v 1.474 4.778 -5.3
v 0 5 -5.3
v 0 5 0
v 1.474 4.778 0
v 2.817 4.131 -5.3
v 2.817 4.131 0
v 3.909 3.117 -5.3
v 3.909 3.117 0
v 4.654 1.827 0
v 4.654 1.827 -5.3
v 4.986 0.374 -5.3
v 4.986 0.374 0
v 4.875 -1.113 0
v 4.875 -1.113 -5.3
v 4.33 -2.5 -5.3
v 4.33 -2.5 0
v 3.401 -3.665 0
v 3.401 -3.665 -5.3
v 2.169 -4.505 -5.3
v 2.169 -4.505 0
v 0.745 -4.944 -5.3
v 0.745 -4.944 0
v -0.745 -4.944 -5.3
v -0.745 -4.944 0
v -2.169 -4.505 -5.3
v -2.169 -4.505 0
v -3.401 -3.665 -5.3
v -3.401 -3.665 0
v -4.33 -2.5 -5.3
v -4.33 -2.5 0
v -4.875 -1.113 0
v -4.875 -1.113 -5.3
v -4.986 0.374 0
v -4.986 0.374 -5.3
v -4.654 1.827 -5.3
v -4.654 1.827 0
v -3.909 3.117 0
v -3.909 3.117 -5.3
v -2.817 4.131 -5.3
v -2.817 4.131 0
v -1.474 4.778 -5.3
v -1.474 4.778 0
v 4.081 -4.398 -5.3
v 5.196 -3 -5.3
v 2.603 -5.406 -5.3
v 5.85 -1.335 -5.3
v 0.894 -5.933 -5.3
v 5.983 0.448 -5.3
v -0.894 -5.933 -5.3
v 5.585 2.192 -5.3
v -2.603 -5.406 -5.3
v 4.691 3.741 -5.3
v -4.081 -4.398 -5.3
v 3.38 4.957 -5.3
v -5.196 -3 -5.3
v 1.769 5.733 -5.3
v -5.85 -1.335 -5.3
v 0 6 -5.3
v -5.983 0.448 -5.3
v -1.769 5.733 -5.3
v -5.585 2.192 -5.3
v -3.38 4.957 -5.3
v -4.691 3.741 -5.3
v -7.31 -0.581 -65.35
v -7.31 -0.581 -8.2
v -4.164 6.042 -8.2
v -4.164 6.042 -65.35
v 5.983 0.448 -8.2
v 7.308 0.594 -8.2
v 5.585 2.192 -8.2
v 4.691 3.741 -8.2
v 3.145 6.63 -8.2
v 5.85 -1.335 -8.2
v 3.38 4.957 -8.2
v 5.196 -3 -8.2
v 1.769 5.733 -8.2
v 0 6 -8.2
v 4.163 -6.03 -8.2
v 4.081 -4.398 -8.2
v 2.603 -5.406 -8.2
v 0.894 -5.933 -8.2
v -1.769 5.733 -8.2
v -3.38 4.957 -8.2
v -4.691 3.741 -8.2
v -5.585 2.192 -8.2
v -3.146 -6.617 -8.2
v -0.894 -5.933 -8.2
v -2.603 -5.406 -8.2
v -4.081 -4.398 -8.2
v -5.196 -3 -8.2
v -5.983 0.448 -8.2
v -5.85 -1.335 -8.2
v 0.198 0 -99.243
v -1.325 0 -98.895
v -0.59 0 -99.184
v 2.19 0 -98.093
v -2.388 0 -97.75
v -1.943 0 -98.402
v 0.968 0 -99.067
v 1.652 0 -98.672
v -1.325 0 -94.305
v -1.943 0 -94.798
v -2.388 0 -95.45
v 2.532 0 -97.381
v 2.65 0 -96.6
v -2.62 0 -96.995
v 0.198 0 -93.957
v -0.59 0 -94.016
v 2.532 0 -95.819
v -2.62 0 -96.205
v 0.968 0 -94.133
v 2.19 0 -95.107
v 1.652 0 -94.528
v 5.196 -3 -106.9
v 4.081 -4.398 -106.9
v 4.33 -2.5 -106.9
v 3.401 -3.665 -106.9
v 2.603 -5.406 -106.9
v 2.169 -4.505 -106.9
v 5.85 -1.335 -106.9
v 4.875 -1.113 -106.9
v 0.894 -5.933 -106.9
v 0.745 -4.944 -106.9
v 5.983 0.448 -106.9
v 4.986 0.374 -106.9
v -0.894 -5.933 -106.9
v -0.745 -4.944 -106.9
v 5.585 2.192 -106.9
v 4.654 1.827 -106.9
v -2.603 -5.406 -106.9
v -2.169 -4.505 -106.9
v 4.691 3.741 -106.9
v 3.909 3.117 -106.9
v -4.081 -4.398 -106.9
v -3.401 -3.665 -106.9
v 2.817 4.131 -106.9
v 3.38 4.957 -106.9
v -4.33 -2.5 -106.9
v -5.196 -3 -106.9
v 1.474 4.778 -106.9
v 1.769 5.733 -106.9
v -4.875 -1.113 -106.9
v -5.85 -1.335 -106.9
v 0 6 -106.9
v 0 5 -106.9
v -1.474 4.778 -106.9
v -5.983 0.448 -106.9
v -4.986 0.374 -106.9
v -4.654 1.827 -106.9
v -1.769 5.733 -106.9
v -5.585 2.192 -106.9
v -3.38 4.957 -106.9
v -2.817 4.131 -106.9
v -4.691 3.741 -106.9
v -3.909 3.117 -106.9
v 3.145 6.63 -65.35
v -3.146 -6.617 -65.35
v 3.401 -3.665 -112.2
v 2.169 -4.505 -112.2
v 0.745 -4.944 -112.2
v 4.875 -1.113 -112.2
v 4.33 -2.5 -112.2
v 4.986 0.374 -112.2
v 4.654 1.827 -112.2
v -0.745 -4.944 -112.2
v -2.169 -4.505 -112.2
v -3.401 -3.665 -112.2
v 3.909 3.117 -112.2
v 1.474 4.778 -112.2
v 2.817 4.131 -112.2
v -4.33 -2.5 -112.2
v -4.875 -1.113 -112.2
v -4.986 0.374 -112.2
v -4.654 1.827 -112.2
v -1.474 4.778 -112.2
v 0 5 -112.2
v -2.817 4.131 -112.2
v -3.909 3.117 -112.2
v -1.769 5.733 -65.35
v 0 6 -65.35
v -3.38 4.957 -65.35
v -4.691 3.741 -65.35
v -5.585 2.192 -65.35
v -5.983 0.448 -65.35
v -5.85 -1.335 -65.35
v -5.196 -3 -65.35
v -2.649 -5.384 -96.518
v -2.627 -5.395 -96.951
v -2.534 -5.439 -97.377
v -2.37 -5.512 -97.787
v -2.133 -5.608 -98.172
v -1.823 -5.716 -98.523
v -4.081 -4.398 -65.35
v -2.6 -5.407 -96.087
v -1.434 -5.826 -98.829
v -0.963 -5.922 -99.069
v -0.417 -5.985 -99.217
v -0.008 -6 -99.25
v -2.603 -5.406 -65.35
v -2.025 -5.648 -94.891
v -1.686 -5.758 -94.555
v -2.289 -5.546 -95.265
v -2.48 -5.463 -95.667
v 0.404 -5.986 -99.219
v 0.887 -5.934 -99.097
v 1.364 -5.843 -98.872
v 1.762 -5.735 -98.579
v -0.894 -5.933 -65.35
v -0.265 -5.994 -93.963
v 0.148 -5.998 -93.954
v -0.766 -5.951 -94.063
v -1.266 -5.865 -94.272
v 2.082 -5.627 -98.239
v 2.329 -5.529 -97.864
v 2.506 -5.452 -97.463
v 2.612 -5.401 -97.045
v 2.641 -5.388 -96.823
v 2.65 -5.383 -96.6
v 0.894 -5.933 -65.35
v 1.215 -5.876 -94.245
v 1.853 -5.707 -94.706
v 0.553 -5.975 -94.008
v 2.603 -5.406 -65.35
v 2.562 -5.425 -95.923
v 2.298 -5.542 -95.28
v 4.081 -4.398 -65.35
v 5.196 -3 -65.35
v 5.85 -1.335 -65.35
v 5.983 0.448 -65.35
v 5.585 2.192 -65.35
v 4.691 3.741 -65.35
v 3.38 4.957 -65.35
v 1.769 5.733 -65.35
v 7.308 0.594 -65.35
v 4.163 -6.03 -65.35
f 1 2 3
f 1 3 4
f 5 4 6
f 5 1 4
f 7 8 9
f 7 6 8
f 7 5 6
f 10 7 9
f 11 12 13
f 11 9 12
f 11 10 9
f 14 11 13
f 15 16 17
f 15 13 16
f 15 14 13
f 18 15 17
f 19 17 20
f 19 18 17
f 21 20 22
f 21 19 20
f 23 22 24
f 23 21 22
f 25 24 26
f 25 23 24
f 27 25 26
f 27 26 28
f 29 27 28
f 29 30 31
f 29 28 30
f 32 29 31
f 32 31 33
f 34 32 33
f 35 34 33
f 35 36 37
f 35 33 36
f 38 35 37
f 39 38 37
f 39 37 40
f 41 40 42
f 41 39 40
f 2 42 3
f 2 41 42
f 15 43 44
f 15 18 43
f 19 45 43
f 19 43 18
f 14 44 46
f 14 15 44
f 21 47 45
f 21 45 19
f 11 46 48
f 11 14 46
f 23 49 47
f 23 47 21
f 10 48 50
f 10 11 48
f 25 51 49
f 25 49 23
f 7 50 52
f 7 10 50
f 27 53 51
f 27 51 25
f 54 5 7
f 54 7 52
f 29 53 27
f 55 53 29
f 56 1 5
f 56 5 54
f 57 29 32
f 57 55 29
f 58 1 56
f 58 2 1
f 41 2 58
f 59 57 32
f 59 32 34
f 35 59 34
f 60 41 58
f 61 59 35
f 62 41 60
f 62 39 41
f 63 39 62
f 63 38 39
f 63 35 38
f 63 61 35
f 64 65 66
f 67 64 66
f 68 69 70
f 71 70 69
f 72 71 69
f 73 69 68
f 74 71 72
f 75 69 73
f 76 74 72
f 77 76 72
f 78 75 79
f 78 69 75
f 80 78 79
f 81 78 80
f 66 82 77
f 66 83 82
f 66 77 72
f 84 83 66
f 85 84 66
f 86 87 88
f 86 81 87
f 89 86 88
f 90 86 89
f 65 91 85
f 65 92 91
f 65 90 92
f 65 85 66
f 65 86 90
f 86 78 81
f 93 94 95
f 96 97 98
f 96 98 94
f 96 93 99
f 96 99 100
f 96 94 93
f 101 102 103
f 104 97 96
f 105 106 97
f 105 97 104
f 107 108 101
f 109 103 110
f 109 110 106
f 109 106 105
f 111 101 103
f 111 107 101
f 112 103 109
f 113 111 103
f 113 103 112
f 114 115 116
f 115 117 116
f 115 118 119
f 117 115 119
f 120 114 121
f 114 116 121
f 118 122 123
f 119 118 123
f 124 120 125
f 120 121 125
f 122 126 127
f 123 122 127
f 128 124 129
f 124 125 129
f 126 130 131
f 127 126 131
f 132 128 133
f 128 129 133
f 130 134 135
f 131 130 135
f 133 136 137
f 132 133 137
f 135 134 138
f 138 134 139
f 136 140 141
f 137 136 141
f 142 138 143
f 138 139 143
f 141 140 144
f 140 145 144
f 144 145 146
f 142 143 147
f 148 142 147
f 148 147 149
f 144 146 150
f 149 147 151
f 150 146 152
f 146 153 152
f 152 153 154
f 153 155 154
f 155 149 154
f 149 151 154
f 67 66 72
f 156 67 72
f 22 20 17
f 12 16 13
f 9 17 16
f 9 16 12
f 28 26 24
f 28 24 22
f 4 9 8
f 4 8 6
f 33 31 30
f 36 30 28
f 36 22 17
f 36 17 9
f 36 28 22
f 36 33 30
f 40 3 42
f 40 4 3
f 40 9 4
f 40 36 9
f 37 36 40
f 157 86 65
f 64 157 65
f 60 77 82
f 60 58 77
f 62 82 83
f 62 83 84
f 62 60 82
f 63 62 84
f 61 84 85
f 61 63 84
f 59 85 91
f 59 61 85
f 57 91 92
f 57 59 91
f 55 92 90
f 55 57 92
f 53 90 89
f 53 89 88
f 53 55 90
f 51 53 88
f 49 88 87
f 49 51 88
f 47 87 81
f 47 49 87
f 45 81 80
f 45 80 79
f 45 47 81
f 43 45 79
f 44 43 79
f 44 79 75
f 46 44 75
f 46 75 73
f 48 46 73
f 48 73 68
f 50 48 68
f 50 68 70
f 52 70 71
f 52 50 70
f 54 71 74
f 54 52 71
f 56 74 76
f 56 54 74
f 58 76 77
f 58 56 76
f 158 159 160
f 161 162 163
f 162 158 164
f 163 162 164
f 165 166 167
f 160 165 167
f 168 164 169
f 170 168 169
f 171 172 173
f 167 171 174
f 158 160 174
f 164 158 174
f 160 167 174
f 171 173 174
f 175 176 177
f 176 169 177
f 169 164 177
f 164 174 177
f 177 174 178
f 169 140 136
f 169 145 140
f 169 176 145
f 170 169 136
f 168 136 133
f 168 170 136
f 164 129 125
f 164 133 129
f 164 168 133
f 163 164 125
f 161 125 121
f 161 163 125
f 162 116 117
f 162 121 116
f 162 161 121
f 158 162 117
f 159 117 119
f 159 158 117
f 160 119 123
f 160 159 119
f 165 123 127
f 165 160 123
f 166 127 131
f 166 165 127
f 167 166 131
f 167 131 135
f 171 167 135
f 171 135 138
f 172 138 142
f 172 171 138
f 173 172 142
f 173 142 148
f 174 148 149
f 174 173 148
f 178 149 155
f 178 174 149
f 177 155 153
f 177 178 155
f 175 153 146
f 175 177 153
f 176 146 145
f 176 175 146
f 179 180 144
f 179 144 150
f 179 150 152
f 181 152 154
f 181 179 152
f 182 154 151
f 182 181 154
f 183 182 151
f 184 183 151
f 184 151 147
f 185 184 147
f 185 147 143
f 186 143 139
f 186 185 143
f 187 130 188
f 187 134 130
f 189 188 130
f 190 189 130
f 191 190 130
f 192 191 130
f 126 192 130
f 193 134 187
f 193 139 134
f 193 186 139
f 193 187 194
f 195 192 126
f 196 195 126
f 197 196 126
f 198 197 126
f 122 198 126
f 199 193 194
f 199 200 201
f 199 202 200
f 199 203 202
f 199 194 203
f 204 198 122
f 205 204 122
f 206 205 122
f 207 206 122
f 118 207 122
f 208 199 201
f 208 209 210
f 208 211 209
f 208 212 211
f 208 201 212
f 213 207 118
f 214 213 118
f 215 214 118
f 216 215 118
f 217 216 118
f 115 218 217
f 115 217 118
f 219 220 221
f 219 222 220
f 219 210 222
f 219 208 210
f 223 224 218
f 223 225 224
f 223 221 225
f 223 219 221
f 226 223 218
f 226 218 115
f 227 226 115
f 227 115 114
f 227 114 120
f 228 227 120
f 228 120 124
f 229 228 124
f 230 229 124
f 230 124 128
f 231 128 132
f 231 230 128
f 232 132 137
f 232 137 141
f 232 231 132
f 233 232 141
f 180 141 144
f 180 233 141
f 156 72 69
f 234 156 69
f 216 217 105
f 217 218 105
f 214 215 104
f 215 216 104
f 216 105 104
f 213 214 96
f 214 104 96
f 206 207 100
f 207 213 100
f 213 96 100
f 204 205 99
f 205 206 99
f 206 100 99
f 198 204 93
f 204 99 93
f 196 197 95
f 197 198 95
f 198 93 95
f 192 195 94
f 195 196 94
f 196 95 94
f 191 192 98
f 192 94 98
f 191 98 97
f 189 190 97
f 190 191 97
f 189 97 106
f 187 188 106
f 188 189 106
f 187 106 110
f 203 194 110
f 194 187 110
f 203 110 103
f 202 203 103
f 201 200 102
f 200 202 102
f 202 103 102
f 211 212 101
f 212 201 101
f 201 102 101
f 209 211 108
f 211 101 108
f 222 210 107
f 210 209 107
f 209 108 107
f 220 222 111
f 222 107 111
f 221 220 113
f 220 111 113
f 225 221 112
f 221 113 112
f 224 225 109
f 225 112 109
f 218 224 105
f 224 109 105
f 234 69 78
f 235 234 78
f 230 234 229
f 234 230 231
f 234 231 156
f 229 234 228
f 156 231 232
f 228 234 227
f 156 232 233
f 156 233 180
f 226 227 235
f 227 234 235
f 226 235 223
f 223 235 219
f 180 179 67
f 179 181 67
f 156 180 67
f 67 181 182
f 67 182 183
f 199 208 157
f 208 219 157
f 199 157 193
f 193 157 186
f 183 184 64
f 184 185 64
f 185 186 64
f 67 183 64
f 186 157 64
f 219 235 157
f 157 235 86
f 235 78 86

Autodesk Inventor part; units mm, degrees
ref_plane "YZ Plane" through (0, 0, 0) normal (1, 0, 0) x (0, 1, 0)
ref_plane "XZ Plane" through (0, 0, 0) normal (0, 1, 0) x (-1, 0, 0)
ref_plane "XY Plane" through (0, 0, 0) normal (0, 0, 1) x (1, 0, 0)
sketch "Sketch1" plane through (0, 0, 0) normal (1, 0, 0) x (0, 1, 0)
  line L0 (5, 0) -> (5, -5.3)
  line L1 (5, -106.9) -> (5, -112.2)
  line L2 (5, -112.2) -> (0, -112.2)
  line L3 (0, -112.2) -> (0, 0)
  line L4 (0, 0) -> (5, 0)
  line L5 (5, -106.9) -> (6, -106.9)
  line L6 (6, -106.9) -> (6, -5.3)
  line L7 (6, -5.3) -> (5, -5.3)
  dimension "d2" = 5
  dimension "d3" = 5.3
  dimension "d4" = 5.3
  dimension "d6" = 112.2
  dimension "d16" = 6
  dimension "d17" = 5
revolve "Revolution1" add sketch "Sketch1" angle 360 about axis through (0, 0, -112.2) along (0, 0, 1)
ref_plane "Work Plane1" through (0, 0, -74.4) normal (0, -1, 0) x (1, 0, 0)
sketch "Sketch3" plane through (0, 0, -74.4) normal (0, -1, 0) x (1, 0, 0)
  circle A0 centre (0, -22.2) radius 2.65
  line L0 (-5, -37.8) -> (5, -37.8) projected
  line L1 (0, -22.2) -> (0, -37.8) construction
  point P0 (0, 74.4)
  dimension "d12" = 5.3
  dimension "d13" = 15.6
extrude "Extrusion2" cut sketch "Sketch3" along normal blind 10
ref_plane "Work Plane4" through (0, 0, -8.2) normal (0, 0, 1) x (1, 0, 0)
sketch "Sketch5" plane through (-142.34, -16.1386, -8.2) normal (0, 0, 1) x (-0.9033, 0.429, 0)
  line L0 (-121.6494, -68.3151) -> (-115.2993, -71.9814)
  line L1 (-115.2993, -71.9814) -> (-115.2993, -79.3139)
  line L2 (-115.2993, -79.3139) -> (-121.6494, -82.9801)
  line L3 (-121.6494, -82.9801) -> (-127.9995, -79.3139)
  line L4 (-127.9995, -79.3139) -> (-127.9995, -71.9814)
  line L5 (-127.9995, -71.9814) -> (-121.6494, -68.3151)
  line L6 (-121.6494, -82.9801) -> (-121.6494, -68.3151) construction
  point P0 (-121.6494, -75.6476)
  point P1 (-121.6494, -75.6476)
  dimension "d21" = 14.665
extrude "Extrusion4" add sketch "Sketch5" against normal blind 57.15
properties part number "Mecanum Axle" material "Stainless Steel"
